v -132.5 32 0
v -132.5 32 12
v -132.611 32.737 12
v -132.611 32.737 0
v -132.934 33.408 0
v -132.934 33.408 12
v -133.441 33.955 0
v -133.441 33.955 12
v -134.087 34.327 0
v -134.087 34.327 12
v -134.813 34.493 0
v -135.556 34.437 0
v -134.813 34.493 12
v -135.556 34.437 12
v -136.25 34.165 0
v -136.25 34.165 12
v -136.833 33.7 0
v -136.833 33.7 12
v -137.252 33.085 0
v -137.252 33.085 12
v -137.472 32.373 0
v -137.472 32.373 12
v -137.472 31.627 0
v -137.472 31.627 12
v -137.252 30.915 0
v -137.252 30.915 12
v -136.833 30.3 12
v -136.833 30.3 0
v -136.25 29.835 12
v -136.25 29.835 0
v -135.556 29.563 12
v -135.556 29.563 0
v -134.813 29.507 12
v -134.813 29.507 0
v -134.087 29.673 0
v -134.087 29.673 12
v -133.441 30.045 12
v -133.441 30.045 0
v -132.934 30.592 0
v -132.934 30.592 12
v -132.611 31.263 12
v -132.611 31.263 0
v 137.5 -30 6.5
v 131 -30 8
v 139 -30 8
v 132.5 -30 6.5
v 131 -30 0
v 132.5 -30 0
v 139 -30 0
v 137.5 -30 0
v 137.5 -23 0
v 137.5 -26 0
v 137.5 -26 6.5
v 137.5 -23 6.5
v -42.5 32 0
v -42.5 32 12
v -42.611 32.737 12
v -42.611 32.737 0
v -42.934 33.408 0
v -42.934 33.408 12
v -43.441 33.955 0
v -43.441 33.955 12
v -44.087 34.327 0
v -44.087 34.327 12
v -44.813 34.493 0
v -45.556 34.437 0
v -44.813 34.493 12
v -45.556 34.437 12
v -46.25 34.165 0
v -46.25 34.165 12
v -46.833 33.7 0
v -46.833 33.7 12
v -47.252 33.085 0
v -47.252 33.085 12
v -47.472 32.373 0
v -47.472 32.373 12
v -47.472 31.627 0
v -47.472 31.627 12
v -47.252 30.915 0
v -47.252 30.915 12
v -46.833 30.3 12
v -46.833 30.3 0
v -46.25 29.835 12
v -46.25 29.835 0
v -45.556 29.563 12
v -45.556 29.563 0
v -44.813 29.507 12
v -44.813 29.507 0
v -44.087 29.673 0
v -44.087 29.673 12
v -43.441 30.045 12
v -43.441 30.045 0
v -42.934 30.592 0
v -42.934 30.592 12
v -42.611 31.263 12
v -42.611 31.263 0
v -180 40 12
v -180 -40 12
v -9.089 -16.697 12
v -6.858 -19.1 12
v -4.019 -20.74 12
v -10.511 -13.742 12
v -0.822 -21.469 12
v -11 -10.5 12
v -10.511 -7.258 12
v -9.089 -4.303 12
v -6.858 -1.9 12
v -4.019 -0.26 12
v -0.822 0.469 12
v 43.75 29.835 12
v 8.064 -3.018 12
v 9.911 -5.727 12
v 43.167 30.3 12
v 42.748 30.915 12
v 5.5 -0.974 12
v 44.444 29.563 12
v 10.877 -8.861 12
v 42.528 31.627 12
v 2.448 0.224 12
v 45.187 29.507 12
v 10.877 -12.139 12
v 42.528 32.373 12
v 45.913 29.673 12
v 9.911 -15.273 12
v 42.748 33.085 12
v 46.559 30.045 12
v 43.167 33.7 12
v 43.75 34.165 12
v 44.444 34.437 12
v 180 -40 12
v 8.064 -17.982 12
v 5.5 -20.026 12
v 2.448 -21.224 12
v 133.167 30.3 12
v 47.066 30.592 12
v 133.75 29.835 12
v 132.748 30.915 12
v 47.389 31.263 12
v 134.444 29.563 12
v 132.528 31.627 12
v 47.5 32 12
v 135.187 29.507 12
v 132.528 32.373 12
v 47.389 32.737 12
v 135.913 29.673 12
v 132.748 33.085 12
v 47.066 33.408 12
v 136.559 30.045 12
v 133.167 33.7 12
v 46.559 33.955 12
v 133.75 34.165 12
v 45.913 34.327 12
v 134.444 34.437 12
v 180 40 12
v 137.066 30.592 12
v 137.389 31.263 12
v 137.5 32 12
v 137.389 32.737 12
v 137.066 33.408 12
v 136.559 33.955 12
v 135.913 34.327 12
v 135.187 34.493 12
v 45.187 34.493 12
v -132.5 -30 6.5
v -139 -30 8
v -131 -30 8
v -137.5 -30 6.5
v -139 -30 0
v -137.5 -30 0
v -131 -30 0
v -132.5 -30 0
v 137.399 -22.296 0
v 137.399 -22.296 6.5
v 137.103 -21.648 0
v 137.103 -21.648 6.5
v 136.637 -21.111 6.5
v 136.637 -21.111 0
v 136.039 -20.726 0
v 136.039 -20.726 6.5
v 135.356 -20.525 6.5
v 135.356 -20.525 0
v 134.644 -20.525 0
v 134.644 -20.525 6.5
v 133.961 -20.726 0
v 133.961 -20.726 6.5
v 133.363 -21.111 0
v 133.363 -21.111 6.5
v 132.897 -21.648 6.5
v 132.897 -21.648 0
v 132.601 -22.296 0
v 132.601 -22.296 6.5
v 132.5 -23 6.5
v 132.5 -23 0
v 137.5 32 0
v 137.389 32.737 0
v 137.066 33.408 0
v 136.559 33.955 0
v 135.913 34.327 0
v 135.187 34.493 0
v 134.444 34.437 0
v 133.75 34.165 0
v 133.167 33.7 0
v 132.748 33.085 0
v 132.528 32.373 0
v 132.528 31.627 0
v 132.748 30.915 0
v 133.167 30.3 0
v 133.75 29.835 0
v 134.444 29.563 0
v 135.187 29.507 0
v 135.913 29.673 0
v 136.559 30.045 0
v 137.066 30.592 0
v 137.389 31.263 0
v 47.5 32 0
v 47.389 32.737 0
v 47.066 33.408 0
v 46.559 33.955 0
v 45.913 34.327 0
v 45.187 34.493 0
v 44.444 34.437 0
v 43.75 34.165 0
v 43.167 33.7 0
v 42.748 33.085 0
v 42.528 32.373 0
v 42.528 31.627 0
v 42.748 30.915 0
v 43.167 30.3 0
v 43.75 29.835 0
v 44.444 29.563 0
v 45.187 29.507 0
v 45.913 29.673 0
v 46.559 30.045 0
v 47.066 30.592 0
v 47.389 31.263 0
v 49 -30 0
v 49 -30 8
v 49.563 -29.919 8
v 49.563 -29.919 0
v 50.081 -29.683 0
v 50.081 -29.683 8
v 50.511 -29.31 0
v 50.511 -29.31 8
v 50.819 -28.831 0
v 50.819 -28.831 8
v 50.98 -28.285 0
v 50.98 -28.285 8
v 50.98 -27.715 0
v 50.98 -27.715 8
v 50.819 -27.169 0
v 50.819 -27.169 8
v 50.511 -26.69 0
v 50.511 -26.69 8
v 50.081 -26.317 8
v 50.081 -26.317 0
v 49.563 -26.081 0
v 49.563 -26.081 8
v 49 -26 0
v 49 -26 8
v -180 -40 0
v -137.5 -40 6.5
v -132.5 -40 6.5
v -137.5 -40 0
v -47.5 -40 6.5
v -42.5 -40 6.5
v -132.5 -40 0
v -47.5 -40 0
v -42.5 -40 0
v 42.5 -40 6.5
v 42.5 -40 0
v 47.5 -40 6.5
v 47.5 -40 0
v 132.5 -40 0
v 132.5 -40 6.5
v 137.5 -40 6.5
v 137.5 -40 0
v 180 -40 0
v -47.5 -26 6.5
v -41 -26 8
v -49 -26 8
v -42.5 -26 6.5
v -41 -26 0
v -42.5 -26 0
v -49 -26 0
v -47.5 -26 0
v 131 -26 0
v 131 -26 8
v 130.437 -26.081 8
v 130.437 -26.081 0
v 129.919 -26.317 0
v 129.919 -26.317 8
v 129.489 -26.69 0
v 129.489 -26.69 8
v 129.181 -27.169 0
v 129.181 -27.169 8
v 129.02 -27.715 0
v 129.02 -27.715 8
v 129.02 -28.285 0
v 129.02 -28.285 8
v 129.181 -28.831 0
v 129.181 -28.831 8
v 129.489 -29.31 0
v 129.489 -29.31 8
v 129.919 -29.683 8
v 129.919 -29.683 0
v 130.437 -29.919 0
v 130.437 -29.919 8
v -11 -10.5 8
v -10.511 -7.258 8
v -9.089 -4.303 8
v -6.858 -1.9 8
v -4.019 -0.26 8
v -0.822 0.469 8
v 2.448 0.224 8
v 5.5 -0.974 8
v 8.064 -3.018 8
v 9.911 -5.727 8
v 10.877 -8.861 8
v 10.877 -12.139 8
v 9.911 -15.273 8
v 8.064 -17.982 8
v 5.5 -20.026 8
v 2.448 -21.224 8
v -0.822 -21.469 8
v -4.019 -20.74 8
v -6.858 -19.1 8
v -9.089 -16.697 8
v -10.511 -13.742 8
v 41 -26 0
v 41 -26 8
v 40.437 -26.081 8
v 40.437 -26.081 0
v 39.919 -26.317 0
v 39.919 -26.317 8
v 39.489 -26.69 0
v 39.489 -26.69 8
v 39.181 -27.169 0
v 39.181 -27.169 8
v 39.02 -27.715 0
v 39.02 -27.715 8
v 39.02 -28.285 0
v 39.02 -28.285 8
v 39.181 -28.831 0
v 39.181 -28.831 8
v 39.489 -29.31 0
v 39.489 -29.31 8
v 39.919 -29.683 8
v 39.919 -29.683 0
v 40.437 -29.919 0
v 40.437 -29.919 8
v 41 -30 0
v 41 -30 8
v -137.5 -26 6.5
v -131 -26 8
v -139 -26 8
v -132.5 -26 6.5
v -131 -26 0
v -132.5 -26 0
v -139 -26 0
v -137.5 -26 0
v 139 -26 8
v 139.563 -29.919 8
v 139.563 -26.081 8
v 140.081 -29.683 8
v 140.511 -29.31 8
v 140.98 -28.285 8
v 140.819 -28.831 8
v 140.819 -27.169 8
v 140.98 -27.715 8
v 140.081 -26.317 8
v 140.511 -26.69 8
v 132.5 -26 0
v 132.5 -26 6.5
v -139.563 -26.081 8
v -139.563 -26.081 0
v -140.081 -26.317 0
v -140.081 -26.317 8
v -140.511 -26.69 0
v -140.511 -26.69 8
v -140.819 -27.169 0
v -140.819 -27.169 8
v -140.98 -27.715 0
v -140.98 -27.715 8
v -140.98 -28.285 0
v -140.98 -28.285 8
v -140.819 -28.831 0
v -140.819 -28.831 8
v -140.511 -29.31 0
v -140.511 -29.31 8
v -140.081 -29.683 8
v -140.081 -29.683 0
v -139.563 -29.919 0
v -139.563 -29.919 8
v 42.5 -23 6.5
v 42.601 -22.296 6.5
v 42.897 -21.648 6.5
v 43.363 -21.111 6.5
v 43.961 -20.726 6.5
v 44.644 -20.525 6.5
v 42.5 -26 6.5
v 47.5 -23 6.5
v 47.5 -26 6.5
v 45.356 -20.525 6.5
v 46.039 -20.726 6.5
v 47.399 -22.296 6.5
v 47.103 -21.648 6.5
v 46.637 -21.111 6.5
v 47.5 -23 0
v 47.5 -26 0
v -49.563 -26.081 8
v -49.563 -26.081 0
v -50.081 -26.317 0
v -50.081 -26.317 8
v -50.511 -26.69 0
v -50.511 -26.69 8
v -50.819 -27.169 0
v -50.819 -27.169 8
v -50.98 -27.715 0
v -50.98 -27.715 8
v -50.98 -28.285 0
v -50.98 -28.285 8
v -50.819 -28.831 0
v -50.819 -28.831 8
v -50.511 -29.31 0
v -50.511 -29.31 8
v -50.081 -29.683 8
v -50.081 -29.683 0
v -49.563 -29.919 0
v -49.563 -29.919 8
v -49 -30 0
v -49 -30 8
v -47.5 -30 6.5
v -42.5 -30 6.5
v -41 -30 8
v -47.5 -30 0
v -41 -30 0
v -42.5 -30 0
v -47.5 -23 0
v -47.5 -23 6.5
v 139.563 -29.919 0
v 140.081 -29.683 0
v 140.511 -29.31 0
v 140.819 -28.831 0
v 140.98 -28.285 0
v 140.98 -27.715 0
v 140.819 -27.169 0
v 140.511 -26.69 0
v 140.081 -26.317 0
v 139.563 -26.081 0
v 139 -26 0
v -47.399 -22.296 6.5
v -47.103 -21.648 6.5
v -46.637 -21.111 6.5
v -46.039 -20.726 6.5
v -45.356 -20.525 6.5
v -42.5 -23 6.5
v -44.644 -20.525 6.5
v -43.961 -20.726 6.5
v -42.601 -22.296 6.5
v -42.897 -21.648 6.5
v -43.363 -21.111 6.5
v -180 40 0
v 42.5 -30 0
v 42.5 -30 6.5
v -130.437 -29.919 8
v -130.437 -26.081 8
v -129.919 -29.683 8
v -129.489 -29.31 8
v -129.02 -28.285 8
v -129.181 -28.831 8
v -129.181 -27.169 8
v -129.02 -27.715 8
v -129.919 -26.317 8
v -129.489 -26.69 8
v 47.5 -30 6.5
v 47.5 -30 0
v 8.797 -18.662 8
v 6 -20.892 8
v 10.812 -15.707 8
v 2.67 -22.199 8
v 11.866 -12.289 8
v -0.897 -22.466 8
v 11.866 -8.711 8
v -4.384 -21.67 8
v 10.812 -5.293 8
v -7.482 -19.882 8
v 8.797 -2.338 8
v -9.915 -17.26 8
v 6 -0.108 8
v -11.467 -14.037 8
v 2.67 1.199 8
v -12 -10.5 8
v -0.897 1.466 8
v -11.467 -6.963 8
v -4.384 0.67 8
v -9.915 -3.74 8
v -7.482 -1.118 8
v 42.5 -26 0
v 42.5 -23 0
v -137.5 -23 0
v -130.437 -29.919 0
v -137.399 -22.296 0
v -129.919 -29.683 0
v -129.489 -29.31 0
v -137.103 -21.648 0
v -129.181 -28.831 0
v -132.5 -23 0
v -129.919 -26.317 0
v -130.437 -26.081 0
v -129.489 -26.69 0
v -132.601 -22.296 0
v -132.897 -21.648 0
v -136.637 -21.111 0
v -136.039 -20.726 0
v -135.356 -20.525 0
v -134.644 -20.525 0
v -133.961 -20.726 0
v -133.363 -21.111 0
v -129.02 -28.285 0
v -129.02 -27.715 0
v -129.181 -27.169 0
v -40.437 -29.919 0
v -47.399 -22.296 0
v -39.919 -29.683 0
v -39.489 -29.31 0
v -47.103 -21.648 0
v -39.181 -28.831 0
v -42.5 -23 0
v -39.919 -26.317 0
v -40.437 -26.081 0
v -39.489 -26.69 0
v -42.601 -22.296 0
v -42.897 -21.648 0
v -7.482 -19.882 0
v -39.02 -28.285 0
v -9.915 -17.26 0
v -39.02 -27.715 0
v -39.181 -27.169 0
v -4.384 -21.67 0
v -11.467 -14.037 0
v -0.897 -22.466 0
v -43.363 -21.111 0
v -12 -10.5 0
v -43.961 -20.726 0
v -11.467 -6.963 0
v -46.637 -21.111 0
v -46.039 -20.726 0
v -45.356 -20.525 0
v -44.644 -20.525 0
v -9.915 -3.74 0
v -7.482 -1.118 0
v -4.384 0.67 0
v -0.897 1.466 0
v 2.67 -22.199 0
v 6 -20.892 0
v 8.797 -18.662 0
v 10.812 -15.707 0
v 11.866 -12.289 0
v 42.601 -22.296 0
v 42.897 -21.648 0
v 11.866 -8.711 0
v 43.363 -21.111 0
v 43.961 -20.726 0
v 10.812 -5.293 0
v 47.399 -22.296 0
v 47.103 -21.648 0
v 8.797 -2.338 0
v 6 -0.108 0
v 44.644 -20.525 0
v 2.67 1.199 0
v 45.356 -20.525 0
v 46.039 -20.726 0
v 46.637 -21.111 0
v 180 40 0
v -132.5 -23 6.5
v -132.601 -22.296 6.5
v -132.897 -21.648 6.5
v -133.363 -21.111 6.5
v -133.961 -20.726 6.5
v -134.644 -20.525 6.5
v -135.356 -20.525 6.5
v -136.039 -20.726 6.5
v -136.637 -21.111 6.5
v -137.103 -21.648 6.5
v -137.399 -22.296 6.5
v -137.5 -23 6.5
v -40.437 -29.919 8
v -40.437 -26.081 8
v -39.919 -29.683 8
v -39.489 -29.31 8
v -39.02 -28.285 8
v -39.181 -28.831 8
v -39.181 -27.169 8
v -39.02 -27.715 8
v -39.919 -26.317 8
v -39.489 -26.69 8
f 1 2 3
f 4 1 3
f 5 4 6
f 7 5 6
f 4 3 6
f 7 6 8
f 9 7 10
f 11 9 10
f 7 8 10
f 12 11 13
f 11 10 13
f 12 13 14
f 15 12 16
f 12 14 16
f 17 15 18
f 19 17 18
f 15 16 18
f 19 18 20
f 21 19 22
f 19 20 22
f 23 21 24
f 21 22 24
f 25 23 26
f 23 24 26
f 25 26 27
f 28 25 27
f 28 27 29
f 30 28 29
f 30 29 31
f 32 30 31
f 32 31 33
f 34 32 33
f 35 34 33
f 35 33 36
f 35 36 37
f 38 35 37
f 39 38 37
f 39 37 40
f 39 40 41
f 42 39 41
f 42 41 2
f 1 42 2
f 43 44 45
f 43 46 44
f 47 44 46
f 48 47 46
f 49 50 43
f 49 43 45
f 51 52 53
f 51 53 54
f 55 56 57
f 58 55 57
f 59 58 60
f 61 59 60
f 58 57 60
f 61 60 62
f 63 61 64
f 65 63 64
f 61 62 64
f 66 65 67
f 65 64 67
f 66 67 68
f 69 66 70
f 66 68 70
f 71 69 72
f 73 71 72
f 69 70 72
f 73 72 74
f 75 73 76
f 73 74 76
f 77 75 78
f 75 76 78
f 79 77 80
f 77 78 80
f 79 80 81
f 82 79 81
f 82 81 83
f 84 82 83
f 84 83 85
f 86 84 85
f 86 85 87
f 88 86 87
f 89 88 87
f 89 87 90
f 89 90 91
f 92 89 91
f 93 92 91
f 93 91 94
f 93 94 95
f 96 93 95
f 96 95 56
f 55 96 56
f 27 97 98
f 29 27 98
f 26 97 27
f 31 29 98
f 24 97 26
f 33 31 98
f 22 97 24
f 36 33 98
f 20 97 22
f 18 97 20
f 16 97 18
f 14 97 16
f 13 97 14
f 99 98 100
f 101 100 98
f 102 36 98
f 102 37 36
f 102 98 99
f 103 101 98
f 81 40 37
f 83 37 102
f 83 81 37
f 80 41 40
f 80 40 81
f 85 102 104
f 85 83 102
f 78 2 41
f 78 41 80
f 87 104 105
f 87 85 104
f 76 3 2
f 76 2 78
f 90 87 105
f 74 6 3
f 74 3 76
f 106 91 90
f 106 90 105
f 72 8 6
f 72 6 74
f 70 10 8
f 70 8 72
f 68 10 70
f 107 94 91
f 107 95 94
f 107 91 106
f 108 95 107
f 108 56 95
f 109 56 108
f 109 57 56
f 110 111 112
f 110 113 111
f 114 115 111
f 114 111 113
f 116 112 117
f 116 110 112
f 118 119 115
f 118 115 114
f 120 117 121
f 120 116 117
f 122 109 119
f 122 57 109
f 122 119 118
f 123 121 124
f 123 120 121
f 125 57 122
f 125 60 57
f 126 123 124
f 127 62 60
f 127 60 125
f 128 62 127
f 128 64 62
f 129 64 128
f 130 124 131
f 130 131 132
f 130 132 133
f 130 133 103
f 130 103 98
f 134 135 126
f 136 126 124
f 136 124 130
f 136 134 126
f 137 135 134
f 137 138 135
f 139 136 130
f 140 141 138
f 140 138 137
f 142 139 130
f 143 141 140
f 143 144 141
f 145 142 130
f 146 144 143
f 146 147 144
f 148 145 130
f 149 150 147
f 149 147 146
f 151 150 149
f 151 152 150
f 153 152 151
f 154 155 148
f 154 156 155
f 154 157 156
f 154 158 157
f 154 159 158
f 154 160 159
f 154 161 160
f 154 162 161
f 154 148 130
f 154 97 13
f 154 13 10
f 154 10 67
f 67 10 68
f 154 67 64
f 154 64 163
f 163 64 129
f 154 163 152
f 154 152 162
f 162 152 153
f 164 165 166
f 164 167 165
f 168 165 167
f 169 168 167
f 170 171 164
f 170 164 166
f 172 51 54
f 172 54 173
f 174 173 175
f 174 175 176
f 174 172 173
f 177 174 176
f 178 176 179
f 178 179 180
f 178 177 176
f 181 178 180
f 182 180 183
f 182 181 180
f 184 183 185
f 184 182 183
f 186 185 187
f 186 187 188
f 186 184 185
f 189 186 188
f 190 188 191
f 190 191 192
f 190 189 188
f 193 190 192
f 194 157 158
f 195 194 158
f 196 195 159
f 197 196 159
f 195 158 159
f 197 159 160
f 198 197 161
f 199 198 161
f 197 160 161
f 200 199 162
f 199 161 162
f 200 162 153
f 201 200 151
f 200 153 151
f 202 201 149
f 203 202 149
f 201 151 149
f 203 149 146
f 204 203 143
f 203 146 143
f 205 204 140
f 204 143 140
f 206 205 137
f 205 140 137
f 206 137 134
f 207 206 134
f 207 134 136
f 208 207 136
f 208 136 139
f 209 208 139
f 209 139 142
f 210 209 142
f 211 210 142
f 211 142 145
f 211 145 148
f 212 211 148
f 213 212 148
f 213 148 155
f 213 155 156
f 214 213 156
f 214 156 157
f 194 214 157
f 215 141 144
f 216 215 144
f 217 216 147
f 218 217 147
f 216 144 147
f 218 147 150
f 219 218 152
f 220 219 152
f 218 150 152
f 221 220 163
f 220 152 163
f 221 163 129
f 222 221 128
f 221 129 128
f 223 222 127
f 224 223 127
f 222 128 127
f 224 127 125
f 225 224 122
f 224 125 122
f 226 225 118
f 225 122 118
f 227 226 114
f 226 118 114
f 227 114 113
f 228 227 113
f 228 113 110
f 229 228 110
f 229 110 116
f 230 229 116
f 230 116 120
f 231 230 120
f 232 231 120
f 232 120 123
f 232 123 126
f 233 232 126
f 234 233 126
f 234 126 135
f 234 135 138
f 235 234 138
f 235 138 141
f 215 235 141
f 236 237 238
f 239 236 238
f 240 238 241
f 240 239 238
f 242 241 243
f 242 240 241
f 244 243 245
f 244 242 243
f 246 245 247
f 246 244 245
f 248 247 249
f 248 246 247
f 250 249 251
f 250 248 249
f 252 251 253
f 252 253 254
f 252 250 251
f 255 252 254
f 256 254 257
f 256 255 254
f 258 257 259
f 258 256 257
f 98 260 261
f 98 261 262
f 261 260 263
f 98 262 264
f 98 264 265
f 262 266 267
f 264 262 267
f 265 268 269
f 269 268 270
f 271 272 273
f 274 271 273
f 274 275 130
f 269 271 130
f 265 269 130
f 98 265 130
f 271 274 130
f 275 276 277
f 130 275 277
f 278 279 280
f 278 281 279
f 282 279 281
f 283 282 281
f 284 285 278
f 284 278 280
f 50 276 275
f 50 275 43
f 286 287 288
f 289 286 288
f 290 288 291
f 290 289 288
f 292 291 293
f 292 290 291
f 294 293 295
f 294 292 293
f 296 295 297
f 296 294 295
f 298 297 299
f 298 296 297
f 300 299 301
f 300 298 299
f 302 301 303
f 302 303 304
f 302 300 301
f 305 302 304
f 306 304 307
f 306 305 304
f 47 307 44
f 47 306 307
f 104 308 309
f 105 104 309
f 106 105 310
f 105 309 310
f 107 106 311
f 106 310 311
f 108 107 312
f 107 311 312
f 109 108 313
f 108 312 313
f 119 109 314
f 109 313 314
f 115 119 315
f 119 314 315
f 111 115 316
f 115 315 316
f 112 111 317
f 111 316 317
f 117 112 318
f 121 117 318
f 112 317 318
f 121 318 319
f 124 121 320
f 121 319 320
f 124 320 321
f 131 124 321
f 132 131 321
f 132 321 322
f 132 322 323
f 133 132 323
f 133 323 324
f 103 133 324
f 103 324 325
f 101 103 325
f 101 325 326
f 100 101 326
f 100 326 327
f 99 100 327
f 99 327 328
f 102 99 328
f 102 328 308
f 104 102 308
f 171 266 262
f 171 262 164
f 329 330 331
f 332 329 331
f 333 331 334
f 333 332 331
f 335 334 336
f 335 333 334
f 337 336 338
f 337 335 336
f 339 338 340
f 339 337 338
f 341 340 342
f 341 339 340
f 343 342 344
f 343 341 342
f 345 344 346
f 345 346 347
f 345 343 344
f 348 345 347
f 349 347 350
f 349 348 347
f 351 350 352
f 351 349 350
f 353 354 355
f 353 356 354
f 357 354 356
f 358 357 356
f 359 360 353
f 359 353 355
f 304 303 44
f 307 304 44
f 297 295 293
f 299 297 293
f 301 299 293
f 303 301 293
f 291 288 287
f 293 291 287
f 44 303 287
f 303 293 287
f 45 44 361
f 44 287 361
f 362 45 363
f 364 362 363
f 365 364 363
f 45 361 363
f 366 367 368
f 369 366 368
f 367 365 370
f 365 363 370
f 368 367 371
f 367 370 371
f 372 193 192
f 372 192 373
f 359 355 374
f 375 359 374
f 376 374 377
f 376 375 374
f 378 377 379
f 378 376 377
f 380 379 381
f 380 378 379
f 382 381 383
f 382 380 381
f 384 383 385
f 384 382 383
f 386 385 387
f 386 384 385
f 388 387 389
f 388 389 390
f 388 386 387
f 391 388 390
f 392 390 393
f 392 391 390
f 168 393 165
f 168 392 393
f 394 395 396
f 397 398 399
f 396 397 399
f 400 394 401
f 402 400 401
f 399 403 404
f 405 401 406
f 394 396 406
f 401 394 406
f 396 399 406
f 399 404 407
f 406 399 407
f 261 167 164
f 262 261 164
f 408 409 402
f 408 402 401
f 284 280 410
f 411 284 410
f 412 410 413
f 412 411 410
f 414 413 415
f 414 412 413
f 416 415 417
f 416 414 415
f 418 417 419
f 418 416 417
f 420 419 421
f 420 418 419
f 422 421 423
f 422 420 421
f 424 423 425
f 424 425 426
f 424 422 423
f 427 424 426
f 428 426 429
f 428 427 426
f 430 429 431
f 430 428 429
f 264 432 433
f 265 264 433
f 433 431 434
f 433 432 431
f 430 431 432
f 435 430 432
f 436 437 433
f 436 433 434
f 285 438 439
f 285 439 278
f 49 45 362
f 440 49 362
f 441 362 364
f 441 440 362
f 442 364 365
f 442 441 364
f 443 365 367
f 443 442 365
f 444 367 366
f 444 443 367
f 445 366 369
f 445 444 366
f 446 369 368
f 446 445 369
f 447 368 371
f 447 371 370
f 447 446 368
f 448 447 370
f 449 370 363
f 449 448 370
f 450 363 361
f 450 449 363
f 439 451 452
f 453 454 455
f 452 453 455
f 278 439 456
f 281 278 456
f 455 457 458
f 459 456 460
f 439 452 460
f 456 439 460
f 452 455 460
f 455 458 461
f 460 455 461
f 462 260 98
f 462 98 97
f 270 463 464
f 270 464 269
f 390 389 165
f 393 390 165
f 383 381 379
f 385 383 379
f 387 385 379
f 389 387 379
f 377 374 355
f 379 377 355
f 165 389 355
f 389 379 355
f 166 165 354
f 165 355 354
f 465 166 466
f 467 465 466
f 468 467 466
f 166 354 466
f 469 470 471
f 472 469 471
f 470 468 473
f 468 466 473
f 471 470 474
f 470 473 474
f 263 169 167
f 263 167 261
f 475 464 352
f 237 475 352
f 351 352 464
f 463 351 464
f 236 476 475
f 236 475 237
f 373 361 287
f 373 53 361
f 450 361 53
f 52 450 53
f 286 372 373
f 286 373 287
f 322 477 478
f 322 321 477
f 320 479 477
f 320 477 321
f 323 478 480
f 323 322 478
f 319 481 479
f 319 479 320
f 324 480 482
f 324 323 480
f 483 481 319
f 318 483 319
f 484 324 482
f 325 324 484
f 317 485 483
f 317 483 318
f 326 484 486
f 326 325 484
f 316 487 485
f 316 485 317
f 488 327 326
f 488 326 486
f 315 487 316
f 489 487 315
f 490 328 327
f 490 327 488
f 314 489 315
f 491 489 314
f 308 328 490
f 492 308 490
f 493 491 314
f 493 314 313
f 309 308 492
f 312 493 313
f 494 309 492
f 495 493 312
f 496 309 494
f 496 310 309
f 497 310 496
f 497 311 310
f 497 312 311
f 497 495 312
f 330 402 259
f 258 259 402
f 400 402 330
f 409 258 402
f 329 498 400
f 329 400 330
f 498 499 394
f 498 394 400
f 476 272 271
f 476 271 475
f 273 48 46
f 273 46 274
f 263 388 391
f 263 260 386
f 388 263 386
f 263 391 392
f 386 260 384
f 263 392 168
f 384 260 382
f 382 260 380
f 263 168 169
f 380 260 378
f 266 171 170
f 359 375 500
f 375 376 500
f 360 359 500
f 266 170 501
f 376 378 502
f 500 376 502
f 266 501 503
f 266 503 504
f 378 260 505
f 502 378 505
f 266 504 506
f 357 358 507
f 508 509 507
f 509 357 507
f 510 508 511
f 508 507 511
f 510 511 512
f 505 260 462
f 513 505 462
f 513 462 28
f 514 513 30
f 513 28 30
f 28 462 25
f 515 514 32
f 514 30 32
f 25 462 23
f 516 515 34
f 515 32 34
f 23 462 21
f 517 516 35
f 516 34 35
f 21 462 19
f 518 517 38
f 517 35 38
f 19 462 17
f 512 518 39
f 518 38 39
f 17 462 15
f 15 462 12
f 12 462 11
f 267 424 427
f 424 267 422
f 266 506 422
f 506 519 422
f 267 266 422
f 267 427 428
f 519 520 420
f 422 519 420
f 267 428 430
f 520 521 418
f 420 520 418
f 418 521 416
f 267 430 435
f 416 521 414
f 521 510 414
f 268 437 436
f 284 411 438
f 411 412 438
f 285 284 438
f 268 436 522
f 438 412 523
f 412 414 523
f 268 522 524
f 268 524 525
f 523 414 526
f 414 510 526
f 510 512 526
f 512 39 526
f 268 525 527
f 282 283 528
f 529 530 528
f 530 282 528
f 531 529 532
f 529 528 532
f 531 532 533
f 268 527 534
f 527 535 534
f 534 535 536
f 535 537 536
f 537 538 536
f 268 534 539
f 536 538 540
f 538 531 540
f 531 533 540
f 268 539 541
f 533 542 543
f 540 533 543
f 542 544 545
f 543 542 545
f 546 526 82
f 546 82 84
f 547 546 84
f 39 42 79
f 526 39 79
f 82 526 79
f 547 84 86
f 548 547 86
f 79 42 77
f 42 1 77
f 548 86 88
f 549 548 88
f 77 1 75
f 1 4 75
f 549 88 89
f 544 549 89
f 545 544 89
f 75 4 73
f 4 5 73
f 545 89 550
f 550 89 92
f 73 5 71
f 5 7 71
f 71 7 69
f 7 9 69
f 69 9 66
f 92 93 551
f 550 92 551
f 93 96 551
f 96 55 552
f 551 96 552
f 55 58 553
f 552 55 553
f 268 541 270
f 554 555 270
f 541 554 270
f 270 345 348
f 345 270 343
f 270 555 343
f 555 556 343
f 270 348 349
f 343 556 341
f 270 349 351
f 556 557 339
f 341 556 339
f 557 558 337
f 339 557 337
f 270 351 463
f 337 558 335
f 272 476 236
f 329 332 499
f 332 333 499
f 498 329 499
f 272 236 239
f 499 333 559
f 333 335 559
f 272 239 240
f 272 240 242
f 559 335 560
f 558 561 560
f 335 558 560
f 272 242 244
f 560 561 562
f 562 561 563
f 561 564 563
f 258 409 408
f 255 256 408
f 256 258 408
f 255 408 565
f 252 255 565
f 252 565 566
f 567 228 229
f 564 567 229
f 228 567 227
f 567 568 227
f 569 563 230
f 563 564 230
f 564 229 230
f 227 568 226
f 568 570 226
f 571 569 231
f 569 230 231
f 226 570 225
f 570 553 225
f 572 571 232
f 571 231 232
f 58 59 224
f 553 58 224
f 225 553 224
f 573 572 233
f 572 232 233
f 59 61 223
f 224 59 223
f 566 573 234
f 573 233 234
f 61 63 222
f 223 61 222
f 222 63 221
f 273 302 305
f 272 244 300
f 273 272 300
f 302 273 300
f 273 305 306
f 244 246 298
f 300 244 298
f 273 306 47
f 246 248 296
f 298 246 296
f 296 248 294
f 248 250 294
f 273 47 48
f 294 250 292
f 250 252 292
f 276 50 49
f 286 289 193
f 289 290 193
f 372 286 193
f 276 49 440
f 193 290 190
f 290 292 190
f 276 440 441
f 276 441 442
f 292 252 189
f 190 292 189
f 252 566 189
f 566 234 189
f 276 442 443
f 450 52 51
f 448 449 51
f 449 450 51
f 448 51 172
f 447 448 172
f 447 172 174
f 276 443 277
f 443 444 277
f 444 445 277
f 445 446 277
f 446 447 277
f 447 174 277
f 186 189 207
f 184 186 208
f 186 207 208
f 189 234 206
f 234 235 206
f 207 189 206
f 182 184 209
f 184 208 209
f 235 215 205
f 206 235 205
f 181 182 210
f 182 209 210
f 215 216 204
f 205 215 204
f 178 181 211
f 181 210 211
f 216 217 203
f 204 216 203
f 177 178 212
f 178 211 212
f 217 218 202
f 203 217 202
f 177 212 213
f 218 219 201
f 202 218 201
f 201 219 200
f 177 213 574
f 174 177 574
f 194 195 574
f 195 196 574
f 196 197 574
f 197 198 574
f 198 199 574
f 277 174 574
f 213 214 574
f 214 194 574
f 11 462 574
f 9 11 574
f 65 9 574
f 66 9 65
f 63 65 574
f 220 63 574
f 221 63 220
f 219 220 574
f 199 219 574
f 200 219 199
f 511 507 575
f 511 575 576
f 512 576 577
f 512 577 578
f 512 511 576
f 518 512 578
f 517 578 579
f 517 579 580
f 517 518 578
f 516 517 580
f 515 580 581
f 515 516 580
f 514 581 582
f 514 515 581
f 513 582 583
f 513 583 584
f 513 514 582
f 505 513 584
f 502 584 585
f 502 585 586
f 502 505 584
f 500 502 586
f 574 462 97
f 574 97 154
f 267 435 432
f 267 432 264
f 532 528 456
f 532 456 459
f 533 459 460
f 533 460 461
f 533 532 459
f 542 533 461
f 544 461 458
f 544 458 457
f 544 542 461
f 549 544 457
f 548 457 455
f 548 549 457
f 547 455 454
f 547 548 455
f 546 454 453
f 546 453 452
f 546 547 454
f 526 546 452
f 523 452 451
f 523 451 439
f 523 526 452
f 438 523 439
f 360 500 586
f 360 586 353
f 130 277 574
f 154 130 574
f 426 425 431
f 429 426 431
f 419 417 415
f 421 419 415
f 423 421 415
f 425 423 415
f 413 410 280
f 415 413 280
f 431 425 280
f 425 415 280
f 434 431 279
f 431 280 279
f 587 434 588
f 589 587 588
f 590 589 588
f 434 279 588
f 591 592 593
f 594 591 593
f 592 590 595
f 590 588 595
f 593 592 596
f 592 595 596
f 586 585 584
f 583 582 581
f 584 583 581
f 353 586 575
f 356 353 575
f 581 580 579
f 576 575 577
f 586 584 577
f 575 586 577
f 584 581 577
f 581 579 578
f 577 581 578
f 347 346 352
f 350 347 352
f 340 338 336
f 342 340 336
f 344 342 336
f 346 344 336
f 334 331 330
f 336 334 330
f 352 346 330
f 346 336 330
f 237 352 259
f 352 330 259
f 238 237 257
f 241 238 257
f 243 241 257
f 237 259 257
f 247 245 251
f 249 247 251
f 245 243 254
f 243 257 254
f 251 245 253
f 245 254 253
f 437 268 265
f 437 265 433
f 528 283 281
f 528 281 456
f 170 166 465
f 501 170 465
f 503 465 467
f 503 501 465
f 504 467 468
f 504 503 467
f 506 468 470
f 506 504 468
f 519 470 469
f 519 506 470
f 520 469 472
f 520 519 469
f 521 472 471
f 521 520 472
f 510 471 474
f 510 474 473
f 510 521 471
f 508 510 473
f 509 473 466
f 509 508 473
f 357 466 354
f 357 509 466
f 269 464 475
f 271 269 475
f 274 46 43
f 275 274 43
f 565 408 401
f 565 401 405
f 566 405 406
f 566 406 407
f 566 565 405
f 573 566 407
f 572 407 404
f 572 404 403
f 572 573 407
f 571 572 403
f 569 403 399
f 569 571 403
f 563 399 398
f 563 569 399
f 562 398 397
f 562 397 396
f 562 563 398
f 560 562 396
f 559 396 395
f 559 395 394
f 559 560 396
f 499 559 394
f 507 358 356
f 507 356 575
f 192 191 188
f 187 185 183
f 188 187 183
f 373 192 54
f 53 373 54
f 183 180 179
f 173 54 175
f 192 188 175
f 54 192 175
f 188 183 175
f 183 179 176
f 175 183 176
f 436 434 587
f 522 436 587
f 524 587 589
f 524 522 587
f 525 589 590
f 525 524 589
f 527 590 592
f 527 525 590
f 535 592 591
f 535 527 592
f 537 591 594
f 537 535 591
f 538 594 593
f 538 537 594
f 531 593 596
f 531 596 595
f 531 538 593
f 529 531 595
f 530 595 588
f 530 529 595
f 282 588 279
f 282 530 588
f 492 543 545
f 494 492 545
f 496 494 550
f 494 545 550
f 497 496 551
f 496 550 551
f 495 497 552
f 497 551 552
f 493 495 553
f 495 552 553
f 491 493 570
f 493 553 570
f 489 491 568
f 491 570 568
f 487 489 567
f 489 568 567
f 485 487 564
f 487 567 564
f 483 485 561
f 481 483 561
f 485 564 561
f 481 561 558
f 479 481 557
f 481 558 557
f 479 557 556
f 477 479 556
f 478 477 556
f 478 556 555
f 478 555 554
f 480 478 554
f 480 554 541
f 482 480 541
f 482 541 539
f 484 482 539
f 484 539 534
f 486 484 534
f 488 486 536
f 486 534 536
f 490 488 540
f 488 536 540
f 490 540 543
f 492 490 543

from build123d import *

# Parameters (mm, degrees)
SKETCH1_W           = 360
SKETCH1_H           = 80
BOSS_EXTRUDE1_DEPTH = 12
CUT_EXTRUDE1_REACH  = 186.781
SKETCH2_R           = 2.5
CUT_EXTRUDE2_DEPTH  = 8
CUT_EXTRUDE3_DEPTH  = 6.5
LPATTERN1_COUNT     = 4
LPATTERN1_PITCH     = 90
SKETCH7_R           = 12
CUT_EXTRUDE4_DEPTH  = 8
CUT_EXTRUDE5_REACH  = 186.564
SKETCH8_R           = 11


with BuildPart() as part:
    # Sketch1 → Boss-Extrude1 (new body)
    with BuildSketch(Plane.XY):
        Rectangle(SKETCH1_W, SKETCH1_H)
    extrude(amount=BOSS_EXTRUDE1_DEPTH)

    # Sketch2 → Cut-Extrude1 (cut, up to next)
    with BuildSketch(Plane.XY.offset(12), mode=Mode.PRIVATE) as cut_extrude1_sk1:
        with Locations((-135, 32)):
            Circle(SKETCH2_R)
    cut_extrude1_tool1 = extrude(cut_extrude1_sk1.sketch, amount=-CUT_EXTRUDE1_REACH, mode=Mode.PRIVATE) & part.part
    cut_extrude1 = cut_extrude1_tool1.solids().sort_by_distance((-135, 32, 12))[0]
    add(cut_extrude1, mode=Mode.SUBTRACT)

    # Sketch4 → Cut-Extrude2 (cut)
    with BuildSketch(Plane(origin=(-23.391380574, 111.176150639, 0), x_dir=(-1, 0, 0), z_dir=(0, 0, -1))):
        with BuildLine():
            Line((107.608619426, -137.176150639), (115.608619426, -137.176150639))
            ThreePointArc((115.608619426, -137.176150639), (117.608619426, -139.176150639), (115.608619426, -141.176150639))
            Line((115.608619426, -141.176150639), (107.608619426, -141.176150639))
            ThreePointArc((107.608619426, -141.176150639), (105.608619426, -139.176150639), (107.608619426, -137.176150639))
        make_face()
    cut_extrude2 = extrude(amount=-CUT_EXTRUDE2_DEPTH, mode=Mode.SUBTRACT)

    # Sketch6 → Cut-Extrude3 (cut)
    with BuildSketch(Plane(origin=(-23.391380574, 111.176150639, 0), x_dir=(-1, 0, 0), z_dir=(0, 0, -1))):
        with BuildLine():
            Line((114.108619426, -134.176150639), (114.108619426, -164.82997736))
            ThreePointArc((114.108619426, -164.82997736), (111.608619426, -167.32997736), (109.108619426, -164.82997736))
            Line((109.108619426, -164.82997736), (109.108619426, -134.176150639))
            ThreePointArc((109.108619426, -134.176150639), (111.608619426, -131.676150639), (114.108619426, -134.176150639))
        make_face()
    cut_extrude3 = extrude(amount=-CUT_EXTRUDE3_DEPTH, mode=Mode.SUBTRACT)

    # LPattern1: Cut-Extrude1, Cut-Extrude2, Cut-Extrude3 ×4
    with Locations(*[(i * LPATTERN1_PITCH, 0, 0) for i in range(1, LPATTERN1_COUNT)]):
        add(cut_extrude1, mode=Mode.SUBTRACT)
        add(cut_extrude2, mode=Mode.SUBTRACT)
        add(cut_extrude3, mode=Mode.SUBTRACT)

    # Sketch7 → Cut-Extrude4 (cut)
    with BuildSketch(Plane(origin=(0, 0, 0), x_dir=(-1, 0, 0), z_dir=(0, 0, -1))):
        with Locations((0, -10.5)):
            Circle(SKETCH7_R)
    extrude(amount=-CUT_EXTRUDE4_DEPTH, mode=Mode.SUBTRACT)

    # Sketch8 → Cut-Extrude5 (cut, up to next)
    with BuildSketch(Plane(origin=(0, 0, 8), x_dir=(-1, 0, 0), z_dir=(0, 0, -1)), mode=Mode.PRIVATE) as cut_extrude5_sk1:
        with Locations((0, -10.5)):
            Circle(SKETCH8_R)
    cut_extrude5_tool1 = extrude(cut_extrude5_sk1.sketch, amount=-CUT_EXTRUDE5_REACH, mode=Mode.PRIVATE) & part.part
    add(cut_extrude5_tool1.solids().sort_by_distance((0, -10.5, 8))[0], mode=Mode.SUBTRACT)


solid = part.part
